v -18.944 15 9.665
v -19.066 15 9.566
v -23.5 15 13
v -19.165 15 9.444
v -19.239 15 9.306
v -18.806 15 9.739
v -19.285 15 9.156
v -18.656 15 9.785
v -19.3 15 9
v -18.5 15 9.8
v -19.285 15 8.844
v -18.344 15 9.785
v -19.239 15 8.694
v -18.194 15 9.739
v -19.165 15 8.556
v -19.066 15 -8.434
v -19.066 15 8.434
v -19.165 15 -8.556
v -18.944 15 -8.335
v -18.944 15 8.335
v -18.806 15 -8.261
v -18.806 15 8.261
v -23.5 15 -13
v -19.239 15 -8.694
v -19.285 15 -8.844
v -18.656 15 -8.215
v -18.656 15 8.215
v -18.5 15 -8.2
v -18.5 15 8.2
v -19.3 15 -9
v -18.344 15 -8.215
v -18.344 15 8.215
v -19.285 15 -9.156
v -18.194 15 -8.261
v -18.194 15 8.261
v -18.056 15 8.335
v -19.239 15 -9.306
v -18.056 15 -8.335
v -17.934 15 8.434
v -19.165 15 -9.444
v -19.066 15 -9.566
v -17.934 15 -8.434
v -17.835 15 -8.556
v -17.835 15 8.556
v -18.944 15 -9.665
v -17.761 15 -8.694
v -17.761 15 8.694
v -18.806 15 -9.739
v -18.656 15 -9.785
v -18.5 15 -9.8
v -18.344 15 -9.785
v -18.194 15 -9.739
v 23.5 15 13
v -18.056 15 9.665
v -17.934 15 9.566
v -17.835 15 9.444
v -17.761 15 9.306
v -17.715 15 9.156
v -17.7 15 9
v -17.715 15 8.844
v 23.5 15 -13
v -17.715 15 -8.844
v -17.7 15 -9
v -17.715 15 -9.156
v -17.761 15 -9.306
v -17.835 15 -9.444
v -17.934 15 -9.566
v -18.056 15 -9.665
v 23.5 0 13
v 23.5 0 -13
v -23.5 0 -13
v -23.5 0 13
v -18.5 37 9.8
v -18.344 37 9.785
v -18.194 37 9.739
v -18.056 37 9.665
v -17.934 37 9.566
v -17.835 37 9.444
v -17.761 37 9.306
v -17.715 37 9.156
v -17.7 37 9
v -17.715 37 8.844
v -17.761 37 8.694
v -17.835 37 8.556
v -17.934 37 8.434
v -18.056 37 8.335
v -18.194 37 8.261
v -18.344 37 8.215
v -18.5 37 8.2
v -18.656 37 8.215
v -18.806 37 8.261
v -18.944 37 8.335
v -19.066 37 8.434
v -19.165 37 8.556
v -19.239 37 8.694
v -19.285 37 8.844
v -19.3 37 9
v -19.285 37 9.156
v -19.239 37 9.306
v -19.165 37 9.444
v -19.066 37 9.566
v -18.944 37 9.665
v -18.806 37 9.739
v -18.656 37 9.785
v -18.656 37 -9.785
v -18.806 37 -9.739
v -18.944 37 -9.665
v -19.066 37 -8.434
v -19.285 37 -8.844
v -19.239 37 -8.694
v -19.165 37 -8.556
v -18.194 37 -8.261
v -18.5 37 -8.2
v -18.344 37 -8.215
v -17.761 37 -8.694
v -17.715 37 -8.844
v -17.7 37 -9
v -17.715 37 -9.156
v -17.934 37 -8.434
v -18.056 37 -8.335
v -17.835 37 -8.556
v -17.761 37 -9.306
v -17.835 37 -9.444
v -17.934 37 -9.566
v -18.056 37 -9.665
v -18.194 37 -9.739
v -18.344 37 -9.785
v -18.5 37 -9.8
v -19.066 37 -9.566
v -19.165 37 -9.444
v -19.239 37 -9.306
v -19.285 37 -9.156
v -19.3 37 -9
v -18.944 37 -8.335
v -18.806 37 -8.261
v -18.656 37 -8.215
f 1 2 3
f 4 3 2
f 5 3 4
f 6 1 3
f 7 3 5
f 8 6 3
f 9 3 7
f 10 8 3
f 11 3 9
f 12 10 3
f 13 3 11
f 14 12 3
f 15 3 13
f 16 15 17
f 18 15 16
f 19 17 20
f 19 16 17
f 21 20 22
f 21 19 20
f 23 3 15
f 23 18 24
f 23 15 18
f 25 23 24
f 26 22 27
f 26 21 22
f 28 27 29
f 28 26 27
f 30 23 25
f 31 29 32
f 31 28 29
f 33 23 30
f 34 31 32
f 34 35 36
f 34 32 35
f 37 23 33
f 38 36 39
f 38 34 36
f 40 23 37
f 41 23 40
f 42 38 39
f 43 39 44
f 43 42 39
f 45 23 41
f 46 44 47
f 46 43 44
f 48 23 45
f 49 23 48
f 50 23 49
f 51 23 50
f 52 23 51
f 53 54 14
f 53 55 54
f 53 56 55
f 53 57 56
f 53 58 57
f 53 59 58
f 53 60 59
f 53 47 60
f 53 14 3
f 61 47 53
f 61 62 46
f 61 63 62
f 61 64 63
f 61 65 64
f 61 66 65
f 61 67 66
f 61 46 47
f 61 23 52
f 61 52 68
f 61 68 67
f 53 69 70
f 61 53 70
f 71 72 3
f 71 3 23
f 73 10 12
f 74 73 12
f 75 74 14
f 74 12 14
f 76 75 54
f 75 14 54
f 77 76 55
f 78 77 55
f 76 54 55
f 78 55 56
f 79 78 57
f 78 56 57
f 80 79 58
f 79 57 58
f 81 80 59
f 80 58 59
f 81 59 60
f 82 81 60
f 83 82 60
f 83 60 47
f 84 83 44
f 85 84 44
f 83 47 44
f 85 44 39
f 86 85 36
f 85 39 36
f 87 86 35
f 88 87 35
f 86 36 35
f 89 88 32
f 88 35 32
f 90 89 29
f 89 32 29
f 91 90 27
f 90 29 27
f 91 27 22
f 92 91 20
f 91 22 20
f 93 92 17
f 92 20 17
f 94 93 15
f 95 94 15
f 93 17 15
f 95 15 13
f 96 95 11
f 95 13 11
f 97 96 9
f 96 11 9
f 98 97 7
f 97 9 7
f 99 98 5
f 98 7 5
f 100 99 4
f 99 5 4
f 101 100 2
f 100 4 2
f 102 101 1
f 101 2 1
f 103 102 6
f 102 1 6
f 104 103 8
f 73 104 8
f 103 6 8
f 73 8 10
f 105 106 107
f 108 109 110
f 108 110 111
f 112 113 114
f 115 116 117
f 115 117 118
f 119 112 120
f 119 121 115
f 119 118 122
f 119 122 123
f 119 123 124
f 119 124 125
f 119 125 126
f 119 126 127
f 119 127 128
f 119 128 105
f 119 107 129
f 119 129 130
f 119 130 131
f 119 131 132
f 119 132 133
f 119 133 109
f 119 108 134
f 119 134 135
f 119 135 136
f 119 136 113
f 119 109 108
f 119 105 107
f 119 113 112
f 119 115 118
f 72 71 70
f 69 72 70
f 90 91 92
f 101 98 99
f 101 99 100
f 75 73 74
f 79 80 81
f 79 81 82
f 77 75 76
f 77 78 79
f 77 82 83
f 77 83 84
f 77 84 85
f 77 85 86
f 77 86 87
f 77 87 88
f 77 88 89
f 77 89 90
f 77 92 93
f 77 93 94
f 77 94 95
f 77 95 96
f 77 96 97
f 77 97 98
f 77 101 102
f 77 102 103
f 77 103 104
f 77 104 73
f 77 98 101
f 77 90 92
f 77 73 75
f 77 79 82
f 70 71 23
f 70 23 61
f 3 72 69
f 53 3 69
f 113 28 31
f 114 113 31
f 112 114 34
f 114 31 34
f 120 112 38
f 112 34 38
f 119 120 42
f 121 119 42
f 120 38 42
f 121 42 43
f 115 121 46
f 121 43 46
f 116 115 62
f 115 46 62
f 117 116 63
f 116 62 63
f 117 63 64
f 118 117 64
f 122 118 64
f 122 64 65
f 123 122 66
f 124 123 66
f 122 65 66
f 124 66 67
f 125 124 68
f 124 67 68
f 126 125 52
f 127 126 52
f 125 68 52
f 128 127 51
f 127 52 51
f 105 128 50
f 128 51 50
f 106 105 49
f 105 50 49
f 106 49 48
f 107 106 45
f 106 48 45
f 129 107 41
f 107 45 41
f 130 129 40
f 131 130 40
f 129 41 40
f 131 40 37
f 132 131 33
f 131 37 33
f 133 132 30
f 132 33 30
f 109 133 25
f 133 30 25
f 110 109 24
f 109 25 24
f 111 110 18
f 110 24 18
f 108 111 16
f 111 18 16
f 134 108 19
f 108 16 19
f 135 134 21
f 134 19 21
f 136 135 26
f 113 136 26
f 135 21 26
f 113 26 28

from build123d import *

# Parameters (mm, degrees)
SK_P01_RECEIVER47X26X15_W  = 47
SK_P01_RECEIVER47X26X15_H  = 26
P01_RECEIVER47X26X15_DEPTH = 15
P02_ANTENNA_START          = 15
SK_P02_ANTENNA_R           = 0.8
P02_ANTENNA_DEPTH          = 22
P03_ANTENNA_START          = 15
SK_P03_ANTENNA_R           = 0.8
P03_ANTENNA_DEPTH          = 22


with BuildPart() as part:
    # SK_P01_Receiver47x26x15 → P01_Receiver47x26x15 (new body)
    with BuildSketch(Plane(origin=(0, 0, 0), x_dir=(1, 0, 0), z_dir=(0, 1, 0))):
        Rectangle(SK_P01_RECEIVER47X26X15_W, SK_P01_RECEIVER47X26X15_H)
    extrude(amount=P01_RECEIVER47X26X15_DEPTH)

    # SK_P02_Antenna → P02_Antenna (add)
    with BuildSketch(Plane(origin=(0, 0, 0), x_dir=(1, 0, 0), z_dir=(0, 1, 0)).offset(P02_ANTENNA_START)):
        with Locations(Location((-18.5, 9, 0), (0, 0, 270))):
            Circle(SK_P02_ANTENNA_R)
    extrude(amount=P02_ANTENNA_DEPTH)

    # SK_P03_Antenna → P03_Antenna (add)
    with BuildSketch(Plane(origin=(0, 0, 0), x_dir=(1, 0, 0), z_dir=(0, 1, 0)).offset(P03_ANTENNA_START)):
        with Locations(Location((-18.5, -9, 0), (0, 0, 270))):
            Circle(SK_P03_ANTENNA_R)
    extrude(amount=P03_ANTENNA_DEPTH)


solid = part.part
